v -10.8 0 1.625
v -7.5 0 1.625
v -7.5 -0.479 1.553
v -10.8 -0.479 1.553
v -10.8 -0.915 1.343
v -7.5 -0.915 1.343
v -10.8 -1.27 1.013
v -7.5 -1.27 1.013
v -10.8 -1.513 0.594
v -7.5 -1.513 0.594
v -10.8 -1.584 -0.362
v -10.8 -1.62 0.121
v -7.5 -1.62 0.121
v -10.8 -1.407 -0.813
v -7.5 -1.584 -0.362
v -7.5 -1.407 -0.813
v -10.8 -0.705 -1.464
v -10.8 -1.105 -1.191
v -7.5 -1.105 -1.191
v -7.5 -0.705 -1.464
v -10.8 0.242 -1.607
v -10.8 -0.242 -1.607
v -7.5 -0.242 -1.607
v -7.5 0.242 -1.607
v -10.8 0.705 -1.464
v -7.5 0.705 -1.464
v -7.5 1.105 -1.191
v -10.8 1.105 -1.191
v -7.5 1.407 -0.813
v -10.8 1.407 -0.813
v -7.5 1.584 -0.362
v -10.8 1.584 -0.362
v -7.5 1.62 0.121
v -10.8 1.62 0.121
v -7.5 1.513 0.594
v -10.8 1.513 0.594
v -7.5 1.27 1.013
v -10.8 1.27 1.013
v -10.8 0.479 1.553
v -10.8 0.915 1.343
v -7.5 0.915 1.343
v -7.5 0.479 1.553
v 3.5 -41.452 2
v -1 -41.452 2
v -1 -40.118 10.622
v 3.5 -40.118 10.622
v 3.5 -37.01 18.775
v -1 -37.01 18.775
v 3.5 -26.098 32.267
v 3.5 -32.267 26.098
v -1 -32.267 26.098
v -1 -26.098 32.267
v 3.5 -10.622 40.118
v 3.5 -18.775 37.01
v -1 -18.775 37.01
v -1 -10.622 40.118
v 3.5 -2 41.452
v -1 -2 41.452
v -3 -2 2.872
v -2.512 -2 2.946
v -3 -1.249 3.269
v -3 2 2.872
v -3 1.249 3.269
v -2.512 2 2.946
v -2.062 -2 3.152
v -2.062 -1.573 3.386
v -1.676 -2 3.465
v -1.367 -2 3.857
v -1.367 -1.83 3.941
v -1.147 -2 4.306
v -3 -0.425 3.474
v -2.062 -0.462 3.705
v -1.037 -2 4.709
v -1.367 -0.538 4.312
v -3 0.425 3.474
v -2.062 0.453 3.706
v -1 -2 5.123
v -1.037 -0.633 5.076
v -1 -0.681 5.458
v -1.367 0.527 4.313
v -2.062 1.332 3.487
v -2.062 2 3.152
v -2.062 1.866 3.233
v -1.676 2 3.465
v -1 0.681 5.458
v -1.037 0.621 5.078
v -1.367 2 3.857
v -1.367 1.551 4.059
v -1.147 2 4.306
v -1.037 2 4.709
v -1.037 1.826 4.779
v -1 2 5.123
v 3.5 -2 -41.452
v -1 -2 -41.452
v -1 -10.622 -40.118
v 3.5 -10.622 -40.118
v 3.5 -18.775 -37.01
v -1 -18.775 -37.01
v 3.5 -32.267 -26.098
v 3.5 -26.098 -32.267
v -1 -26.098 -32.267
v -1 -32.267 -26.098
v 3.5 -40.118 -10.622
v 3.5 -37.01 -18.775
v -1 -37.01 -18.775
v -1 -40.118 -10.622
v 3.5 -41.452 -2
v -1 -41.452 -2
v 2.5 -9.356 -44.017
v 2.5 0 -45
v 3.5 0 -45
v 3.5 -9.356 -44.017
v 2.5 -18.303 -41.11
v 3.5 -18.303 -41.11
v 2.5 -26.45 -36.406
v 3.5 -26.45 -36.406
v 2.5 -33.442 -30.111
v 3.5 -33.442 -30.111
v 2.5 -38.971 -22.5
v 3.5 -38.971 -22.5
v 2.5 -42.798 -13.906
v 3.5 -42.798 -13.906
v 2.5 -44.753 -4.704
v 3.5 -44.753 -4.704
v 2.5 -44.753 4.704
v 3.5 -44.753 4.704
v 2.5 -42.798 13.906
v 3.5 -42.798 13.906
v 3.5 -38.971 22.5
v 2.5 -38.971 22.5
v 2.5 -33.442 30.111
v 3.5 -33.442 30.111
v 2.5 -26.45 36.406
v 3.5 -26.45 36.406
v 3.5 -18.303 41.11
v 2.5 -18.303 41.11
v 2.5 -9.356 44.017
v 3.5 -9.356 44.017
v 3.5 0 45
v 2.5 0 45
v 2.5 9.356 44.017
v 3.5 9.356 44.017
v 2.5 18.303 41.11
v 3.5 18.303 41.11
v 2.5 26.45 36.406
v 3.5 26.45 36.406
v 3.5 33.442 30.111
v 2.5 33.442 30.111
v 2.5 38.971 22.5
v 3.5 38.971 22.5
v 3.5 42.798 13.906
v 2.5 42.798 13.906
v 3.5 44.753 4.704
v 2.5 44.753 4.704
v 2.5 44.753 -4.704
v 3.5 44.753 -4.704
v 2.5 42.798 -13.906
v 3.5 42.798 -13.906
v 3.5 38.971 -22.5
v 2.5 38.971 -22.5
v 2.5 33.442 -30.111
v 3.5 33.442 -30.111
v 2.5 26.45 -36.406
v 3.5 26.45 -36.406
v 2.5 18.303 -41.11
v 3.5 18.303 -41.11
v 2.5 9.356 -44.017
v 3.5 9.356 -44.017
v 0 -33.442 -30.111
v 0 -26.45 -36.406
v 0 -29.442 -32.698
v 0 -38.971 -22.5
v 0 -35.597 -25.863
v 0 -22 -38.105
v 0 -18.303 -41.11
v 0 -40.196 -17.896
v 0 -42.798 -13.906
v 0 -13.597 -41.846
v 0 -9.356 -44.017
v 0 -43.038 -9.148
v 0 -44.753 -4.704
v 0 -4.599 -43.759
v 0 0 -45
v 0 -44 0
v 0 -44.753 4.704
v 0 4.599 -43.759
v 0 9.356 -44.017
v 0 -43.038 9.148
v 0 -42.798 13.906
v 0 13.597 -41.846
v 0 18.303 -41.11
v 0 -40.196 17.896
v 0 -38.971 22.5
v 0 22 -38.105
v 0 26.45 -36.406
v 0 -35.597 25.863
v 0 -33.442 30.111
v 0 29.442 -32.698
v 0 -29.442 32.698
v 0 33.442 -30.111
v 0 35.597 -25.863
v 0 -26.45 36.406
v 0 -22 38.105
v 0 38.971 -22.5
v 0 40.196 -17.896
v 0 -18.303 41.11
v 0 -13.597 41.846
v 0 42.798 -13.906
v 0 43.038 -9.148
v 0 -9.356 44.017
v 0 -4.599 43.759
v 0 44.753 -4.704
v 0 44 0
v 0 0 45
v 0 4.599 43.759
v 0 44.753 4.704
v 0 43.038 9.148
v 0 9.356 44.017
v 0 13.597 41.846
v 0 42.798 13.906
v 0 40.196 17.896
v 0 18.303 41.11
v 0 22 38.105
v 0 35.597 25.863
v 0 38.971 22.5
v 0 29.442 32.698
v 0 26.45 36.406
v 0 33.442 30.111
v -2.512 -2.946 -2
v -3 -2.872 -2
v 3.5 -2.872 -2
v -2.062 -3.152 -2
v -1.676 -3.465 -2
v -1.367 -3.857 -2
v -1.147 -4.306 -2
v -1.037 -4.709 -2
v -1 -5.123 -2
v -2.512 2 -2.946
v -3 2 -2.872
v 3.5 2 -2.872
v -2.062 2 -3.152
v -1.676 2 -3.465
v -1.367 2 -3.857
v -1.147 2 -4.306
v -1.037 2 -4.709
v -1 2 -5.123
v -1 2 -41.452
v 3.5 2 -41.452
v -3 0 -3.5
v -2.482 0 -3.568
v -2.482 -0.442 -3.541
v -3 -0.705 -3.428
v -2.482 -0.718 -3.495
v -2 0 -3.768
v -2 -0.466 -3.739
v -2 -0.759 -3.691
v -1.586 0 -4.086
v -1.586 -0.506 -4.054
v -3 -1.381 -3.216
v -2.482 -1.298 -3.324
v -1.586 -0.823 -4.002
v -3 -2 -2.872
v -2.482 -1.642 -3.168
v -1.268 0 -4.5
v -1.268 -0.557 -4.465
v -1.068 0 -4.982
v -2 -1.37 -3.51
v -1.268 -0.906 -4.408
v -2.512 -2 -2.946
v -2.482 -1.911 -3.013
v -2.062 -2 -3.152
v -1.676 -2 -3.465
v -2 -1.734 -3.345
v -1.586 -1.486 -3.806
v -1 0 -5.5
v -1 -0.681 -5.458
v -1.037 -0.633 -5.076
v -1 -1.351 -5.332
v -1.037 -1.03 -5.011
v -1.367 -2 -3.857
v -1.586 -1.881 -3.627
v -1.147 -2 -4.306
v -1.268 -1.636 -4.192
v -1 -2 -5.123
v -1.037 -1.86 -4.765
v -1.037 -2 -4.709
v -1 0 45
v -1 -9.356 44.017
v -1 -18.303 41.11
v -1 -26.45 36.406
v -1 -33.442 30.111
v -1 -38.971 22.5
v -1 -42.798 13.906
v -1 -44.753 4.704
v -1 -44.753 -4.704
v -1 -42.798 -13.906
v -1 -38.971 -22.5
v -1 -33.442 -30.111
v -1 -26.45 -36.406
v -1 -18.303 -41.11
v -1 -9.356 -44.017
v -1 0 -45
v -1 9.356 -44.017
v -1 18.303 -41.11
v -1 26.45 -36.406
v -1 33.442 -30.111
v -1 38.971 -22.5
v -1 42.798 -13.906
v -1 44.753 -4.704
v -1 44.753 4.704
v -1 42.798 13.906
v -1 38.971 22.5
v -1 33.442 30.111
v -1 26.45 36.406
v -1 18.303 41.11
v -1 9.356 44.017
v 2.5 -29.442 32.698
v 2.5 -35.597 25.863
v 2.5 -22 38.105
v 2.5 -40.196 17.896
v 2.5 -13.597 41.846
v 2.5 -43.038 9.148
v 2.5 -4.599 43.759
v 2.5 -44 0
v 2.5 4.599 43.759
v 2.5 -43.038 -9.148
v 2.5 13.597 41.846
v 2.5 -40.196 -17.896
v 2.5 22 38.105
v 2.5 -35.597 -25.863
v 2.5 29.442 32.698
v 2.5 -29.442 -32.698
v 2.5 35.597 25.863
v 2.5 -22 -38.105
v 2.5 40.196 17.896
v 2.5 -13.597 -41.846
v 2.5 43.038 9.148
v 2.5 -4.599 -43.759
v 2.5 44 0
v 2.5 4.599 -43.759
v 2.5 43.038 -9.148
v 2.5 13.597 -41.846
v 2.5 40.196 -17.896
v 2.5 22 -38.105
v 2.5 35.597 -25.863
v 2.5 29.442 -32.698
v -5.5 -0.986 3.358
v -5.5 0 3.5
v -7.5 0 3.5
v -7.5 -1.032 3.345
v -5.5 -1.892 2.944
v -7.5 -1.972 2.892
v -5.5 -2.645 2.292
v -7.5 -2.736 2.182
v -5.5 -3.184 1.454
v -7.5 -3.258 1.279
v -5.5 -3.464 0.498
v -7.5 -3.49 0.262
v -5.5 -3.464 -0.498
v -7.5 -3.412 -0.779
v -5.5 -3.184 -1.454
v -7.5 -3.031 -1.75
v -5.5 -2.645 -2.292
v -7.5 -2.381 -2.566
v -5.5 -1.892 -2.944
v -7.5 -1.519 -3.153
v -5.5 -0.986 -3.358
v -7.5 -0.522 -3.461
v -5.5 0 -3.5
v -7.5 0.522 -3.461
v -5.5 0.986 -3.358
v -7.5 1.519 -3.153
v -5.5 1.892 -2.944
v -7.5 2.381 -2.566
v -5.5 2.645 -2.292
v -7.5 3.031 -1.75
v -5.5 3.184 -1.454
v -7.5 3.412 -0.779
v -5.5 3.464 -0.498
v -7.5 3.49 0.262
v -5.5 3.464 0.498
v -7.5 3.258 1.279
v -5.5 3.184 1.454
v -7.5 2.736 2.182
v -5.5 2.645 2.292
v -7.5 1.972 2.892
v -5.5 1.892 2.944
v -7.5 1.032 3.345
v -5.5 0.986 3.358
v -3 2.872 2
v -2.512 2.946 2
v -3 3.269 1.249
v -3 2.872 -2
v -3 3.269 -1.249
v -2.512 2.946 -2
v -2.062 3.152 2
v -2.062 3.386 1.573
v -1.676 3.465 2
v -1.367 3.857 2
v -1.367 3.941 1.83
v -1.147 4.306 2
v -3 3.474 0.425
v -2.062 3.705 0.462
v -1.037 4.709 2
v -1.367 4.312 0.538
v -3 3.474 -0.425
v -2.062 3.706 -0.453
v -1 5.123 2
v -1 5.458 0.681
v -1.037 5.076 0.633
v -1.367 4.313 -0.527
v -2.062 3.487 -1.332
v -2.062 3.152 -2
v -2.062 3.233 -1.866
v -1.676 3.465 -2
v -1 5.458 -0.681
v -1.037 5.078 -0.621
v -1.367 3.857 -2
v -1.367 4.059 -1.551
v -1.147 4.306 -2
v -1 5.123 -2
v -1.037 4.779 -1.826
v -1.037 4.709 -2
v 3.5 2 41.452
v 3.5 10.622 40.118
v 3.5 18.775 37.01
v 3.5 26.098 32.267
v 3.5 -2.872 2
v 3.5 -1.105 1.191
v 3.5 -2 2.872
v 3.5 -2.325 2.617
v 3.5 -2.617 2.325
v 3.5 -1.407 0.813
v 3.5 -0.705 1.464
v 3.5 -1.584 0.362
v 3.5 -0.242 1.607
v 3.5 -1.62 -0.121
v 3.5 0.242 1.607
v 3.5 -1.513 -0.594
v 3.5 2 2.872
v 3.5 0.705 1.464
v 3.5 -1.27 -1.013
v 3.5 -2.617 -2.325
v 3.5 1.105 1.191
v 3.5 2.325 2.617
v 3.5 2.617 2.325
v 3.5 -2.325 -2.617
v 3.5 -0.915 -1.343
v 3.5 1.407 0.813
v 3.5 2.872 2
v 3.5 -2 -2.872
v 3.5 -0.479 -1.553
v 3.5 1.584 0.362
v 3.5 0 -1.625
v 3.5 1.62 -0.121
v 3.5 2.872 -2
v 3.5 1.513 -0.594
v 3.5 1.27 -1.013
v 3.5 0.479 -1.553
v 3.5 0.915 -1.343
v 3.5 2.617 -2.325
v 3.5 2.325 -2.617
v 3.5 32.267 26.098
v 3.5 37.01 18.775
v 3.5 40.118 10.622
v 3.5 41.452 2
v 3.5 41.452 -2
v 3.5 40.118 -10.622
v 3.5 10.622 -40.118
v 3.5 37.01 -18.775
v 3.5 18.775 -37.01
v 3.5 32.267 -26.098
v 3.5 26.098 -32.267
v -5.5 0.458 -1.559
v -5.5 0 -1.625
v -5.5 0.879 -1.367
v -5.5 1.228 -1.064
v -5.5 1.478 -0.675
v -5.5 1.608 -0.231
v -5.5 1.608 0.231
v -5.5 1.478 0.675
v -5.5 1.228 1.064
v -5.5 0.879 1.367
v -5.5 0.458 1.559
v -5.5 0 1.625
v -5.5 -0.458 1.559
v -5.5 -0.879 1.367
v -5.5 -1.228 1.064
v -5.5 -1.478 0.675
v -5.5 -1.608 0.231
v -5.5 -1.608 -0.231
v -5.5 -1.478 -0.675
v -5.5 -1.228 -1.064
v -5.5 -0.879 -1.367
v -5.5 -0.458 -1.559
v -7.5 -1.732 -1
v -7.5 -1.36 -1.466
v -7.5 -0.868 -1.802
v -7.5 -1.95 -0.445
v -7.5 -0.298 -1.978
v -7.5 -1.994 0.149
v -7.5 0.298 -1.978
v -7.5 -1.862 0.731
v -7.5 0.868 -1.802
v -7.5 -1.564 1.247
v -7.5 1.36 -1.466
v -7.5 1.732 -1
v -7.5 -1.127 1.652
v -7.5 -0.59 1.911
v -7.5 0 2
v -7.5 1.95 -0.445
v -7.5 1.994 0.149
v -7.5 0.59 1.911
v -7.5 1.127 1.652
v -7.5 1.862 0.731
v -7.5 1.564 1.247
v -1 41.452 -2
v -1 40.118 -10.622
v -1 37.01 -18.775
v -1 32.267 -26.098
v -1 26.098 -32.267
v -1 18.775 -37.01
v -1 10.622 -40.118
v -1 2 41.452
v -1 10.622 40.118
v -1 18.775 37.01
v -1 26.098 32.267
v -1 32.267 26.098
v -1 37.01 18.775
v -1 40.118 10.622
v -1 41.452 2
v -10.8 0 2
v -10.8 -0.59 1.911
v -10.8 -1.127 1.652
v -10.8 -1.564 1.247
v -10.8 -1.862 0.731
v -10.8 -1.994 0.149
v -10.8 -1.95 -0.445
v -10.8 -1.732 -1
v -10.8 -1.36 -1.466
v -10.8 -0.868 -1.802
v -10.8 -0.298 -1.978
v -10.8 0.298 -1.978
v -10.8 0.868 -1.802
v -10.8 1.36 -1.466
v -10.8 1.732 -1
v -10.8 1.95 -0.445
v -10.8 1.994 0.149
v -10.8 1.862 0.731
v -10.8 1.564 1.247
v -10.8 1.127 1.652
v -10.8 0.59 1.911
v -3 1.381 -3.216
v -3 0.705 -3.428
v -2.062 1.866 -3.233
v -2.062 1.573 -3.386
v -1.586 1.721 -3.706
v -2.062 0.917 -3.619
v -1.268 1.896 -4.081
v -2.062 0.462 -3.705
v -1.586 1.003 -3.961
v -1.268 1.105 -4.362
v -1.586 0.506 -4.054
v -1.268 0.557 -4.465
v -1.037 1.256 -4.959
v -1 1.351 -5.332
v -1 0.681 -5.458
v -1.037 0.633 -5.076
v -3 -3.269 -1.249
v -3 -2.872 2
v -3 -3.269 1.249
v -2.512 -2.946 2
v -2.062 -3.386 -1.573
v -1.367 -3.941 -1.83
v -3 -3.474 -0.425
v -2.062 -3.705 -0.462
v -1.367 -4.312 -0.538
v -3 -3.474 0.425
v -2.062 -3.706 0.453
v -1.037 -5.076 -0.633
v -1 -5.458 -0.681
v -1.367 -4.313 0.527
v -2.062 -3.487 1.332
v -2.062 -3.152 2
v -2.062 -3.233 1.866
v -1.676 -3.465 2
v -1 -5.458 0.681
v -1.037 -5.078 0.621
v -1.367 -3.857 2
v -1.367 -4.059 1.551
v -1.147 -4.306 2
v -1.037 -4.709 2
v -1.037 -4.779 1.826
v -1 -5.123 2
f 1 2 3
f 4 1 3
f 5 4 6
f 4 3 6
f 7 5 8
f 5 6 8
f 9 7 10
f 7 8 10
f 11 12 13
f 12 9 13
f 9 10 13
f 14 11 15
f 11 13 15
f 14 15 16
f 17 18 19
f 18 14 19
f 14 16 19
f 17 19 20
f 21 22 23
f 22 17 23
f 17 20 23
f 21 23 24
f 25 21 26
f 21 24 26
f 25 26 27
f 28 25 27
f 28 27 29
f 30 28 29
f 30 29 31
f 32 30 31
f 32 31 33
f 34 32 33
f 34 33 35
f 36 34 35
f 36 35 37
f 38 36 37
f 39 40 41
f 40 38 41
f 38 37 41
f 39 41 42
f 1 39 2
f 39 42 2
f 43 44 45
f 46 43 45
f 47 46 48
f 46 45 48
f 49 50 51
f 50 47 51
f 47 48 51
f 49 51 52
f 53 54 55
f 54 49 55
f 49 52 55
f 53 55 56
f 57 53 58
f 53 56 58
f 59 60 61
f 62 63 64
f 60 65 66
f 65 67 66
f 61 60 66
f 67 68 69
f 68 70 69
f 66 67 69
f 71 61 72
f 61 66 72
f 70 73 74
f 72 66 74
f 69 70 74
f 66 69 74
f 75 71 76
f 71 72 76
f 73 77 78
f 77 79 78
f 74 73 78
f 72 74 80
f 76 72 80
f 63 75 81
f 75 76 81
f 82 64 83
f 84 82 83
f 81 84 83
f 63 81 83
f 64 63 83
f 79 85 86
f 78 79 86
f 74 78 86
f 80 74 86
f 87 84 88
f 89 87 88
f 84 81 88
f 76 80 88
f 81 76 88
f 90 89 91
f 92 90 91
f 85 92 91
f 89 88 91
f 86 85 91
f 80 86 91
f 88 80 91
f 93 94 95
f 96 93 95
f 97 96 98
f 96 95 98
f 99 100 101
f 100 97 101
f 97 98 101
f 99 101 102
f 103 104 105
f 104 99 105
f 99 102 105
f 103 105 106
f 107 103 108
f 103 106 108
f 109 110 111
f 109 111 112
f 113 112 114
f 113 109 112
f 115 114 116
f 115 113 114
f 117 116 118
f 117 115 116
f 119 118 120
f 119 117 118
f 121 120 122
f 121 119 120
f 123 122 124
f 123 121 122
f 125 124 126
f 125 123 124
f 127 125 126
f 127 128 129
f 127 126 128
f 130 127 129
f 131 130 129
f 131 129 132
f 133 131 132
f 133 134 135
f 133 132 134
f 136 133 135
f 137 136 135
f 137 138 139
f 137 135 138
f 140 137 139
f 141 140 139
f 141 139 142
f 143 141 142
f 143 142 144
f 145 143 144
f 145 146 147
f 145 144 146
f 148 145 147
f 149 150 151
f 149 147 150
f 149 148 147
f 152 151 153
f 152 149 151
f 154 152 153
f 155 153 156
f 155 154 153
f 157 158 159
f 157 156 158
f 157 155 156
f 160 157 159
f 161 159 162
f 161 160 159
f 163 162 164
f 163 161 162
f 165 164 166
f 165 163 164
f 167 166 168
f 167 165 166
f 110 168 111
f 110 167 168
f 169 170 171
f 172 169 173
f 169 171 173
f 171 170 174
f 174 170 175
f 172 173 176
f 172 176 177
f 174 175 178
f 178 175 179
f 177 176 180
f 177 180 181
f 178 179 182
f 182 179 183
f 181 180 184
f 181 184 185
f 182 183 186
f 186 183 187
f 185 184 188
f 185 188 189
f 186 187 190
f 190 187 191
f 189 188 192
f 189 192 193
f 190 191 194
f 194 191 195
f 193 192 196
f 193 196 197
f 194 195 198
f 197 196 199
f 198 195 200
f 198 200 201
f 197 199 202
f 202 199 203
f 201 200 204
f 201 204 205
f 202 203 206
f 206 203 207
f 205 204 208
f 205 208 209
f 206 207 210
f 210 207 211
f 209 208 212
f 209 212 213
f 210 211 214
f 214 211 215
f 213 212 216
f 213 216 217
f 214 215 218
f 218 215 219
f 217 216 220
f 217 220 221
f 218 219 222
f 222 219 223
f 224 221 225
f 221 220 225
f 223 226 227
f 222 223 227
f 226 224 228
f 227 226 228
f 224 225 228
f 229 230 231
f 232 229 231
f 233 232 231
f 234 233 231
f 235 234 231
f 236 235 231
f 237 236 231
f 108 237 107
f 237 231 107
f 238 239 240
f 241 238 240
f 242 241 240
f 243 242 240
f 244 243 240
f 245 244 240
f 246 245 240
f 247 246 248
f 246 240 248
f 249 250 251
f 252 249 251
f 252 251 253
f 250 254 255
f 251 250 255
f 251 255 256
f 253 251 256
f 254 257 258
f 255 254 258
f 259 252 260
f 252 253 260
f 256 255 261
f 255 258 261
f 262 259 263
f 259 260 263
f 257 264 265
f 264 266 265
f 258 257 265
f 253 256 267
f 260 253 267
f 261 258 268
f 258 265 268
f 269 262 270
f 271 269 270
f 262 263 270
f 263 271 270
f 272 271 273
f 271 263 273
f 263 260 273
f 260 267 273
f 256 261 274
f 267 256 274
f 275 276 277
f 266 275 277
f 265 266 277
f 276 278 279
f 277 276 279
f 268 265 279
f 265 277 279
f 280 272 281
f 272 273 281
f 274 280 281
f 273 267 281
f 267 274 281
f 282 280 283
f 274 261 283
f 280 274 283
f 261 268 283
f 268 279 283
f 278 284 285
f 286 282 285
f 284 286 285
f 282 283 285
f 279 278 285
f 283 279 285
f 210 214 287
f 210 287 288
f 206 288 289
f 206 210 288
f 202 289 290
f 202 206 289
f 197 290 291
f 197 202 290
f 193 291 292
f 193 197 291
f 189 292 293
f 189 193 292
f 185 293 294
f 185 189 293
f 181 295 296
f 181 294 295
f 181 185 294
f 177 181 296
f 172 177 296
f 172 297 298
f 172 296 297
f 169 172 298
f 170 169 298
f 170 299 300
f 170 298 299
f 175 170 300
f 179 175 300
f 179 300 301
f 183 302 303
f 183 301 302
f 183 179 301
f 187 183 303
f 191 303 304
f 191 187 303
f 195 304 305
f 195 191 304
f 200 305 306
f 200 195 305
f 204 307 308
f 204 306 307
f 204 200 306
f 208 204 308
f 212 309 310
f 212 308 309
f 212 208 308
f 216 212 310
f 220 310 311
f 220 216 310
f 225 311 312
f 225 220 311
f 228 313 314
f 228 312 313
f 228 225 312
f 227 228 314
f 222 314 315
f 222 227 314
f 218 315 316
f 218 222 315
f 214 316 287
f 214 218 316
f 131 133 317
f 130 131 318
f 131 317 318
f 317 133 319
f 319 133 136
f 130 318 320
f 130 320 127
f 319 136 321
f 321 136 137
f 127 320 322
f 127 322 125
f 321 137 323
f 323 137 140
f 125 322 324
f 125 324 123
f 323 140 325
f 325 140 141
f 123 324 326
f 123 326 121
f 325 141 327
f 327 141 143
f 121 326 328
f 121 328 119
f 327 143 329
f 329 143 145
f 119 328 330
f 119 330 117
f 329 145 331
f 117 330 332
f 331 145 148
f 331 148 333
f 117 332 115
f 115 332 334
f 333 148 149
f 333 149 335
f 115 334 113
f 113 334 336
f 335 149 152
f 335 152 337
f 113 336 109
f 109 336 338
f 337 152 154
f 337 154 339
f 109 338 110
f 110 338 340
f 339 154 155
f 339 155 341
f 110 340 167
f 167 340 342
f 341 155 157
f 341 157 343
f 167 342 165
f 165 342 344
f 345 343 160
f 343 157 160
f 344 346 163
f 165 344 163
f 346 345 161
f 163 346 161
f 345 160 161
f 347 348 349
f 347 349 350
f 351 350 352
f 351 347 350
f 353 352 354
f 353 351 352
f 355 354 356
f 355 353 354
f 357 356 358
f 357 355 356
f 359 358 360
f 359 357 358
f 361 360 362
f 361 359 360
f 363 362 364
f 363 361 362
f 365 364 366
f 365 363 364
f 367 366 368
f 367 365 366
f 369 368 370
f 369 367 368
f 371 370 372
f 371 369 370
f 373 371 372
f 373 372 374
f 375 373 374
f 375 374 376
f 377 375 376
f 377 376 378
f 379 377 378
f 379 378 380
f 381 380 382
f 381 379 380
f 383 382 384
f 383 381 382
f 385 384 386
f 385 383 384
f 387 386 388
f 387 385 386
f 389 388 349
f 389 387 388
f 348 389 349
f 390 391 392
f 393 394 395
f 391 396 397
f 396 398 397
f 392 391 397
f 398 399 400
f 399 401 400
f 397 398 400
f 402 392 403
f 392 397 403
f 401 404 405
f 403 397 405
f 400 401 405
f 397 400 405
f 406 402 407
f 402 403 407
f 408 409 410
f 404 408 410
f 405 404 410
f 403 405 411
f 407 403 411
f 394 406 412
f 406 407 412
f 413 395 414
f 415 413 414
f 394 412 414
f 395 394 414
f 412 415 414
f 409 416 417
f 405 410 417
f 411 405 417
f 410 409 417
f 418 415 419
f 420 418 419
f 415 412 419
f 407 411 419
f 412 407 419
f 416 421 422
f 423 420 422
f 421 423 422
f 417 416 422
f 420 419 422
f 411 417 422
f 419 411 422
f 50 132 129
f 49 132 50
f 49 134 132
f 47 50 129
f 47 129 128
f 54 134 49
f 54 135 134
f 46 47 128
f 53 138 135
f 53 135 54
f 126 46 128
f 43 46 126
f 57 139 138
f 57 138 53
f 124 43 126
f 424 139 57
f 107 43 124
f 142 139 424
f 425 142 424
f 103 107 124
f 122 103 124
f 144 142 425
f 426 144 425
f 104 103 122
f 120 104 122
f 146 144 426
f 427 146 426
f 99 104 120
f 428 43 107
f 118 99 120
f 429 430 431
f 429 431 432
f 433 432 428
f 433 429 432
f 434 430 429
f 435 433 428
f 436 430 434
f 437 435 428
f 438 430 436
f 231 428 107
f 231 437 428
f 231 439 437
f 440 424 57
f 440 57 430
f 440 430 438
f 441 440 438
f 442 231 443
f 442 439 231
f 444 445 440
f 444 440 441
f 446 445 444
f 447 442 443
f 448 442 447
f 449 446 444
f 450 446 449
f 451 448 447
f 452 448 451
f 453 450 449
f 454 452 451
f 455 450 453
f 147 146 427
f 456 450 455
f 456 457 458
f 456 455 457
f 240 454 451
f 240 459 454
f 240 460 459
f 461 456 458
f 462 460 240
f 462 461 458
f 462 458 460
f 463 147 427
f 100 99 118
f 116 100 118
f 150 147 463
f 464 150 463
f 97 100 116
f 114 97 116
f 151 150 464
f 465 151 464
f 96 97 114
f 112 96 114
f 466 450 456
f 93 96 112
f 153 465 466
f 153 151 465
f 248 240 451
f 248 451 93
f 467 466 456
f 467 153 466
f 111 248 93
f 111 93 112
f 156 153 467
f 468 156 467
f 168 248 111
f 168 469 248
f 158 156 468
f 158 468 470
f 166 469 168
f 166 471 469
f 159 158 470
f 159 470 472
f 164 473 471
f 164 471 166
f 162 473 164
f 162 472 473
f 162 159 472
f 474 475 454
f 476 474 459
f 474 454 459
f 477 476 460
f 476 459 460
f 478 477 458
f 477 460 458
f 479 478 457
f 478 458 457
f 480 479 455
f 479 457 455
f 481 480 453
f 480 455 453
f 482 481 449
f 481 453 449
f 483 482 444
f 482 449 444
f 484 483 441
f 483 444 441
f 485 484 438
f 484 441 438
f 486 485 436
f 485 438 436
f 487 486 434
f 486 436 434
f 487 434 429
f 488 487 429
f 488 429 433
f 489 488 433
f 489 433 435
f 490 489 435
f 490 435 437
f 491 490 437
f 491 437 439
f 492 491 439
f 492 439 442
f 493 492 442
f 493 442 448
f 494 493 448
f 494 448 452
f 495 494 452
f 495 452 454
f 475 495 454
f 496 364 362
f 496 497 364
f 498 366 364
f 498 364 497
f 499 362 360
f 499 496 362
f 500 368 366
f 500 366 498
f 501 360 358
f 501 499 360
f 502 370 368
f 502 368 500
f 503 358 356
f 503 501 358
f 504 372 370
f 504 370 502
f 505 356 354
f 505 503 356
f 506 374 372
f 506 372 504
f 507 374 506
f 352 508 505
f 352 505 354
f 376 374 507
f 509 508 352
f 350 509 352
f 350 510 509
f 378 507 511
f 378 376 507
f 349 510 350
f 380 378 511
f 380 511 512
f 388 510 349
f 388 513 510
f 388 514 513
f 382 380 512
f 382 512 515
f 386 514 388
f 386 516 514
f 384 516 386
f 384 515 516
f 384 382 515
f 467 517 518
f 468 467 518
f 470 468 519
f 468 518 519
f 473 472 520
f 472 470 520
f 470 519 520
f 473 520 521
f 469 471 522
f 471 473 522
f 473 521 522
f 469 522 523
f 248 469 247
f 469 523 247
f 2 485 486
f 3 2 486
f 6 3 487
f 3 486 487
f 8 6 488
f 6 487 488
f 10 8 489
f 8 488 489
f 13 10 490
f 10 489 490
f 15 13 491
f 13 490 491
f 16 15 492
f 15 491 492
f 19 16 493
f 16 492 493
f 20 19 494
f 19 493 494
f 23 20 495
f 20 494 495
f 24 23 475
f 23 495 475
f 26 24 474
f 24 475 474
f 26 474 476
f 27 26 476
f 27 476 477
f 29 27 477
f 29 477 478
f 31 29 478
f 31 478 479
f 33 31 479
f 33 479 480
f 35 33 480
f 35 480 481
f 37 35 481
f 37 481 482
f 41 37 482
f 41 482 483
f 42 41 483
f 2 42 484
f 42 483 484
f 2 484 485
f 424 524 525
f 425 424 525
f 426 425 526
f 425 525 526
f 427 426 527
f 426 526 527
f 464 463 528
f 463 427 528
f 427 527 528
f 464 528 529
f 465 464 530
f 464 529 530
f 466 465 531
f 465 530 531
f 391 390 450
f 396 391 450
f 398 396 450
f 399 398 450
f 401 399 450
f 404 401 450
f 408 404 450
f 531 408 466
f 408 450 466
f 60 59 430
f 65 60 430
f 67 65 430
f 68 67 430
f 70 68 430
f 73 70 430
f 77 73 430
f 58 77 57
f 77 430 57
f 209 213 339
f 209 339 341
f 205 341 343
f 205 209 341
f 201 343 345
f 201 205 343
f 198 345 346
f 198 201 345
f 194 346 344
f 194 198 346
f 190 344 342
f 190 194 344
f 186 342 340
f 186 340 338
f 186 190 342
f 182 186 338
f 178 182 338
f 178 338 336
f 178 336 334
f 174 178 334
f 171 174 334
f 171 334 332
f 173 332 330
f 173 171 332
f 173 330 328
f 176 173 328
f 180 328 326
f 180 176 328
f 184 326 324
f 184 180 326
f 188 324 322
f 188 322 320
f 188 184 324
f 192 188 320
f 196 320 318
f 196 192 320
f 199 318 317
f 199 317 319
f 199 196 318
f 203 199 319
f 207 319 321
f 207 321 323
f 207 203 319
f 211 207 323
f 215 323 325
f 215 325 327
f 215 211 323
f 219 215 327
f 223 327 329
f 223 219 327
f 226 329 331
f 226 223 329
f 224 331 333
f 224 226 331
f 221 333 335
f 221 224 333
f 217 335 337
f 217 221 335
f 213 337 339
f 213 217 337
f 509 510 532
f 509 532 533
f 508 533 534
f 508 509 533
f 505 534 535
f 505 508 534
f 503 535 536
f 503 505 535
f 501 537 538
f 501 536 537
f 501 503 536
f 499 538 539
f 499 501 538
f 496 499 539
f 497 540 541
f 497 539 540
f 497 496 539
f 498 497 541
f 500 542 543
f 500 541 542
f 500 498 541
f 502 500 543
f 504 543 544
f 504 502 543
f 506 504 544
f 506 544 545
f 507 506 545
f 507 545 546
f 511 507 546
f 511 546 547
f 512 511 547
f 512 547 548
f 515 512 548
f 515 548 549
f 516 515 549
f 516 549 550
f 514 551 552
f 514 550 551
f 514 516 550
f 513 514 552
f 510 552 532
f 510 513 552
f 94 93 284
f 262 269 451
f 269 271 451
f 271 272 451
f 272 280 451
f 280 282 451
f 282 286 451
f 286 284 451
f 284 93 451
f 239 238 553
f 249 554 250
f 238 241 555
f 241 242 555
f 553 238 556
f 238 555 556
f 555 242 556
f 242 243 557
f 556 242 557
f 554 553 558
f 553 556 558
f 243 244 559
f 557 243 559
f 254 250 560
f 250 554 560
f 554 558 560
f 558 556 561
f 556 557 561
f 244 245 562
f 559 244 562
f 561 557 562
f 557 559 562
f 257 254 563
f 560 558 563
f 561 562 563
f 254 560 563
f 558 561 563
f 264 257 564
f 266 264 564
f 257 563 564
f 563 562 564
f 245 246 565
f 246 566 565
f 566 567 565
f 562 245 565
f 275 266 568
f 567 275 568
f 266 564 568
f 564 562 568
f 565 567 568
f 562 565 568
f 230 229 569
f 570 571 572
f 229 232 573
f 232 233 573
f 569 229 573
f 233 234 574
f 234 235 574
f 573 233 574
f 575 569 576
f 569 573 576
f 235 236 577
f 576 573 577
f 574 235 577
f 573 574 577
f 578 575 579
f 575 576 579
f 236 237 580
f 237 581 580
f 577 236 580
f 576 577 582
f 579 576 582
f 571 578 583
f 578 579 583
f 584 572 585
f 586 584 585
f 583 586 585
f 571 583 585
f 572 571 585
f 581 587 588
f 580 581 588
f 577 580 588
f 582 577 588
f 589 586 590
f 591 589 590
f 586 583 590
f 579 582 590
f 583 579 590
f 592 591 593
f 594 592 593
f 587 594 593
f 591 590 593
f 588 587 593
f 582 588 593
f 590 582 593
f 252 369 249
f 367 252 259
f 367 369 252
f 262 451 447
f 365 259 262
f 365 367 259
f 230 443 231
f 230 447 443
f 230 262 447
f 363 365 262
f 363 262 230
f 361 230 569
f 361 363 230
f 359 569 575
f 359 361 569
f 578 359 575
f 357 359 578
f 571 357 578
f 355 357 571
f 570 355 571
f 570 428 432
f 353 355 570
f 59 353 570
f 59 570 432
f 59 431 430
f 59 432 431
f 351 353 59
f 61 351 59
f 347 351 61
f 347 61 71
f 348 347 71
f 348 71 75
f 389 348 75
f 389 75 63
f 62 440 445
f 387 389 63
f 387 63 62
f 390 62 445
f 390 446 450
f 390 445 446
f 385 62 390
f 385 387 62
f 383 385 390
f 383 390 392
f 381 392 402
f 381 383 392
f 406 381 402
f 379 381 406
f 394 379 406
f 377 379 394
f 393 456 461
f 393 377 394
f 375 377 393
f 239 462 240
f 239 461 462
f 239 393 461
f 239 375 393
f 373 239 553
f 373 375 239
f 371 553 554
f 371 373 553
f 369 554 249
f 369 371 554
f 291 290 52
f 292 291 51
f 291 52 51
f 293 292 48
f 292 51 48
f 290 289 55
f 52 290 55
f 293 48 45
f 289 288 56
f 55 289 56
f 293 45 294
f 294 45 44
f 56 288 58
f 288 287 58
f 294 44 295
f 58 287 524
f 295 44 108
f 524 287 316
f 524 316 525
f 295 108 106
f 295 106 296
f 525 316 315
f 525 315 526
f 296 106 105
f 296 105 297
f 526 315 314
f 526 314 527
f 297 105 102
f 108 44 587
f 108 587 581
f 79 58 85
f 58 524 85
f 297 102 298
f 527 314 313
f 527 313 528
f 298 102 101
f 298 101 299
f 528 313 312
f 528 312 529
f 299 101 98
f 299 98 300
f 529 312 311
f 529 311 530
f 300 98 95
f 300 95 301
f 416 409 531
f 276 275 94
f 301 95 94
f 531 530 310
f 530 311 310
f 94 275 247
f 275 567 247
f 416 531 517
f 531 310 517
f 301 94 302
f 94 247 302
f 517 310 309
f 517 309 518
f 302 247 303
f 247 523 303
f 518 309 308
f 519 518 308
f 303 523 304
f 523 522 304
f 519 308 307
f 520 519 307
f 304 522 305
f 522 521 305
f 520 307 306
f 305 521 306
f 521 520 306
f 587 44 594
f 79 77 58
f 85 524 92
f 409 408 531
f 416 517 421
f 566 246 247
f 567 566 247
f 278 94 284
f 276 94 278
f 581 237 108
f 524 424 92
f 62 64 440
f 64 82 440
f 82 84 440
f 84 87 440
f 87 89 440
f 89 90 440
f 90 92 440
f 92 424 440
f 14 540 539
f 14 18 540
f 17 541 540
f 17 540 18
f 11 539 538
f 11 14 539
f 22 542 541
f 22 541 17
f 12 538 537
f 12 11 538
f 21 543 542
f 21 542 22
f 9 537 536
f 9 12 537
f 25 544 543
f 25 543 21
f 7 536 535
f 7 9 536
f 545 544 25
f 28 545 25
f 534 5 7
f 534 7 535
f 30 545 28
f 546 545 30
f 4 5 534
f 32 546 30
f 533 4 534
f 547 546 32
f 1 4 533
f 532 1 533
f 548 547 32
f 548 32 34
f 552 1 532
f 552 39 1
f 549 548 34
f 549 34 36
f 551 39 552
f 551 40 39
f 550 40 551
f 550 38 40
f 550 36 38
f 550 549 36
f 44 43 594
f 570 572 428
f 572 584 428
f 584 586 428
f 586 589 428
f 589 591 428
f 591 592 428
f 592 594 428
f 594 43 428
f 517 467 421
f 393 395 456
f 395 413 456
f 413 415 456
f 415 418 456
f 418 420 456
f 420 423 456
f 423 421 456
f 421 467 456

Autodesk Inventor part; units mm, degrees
ref_plane "YZ Plane" through (0, 0, 0) normal (1, 0, 0) x (0, 1, 0)
ref_plane "XZ Plane" through (0, 0, 0) normal (0, 1, 0) x (-1, 0, 0)
ref_plane "XY Plane" through (0, 0, 0) normal (0, 0, 1) x (1, 0, 0)
sketch "Sketch1" plane through (0, 0, 0) normal (1, 0, 0) x (0, 1, 0)
  circle A0 centre (0, 0) radius 44
  dimension "d0" = 88
extrude "Extrusion1" add sketch "Sketch1" along normal blind 3.5
sketch "Sketch2" plane through (3.5, 0, 0) normal (1, 0, 0) x (0, 0, -1)
  circle A0 centre (0, 0) radius 45
  dimension "d3" = 90
extrude "Extrusion2" add sketch "Sketch2" along normal blind 1
sketch "Sketch3" plane through (0, 0, 0) normal (-1, 0, 0) x (0, 0, 1)
  circle A0 centre (0, 0) radius 45
  dimension "d6" = 90
extrude "Extrusion3" add sketch "Sketch3" along normal blind 1
sketch "Sketch4" plane through (4.5, 0, 0) normal (1, 0, 0) x (0, 0, -1)
  circle A0 centre (0, 0) radius 41.5
  dimension "d9" = 83
extrude "Extrusion4" cut sketch "Sketch4" against normal blind 6
sketch "Sketch5" plane through (4.5, 0, 0) normal (1, 0, 0) x (0, 0, -1)
  circle A0 centre (0, 0) radius 3.5
  dimension "d12" = 7
extrude "Extrusion5" add sketch "Sketch5" against normal blind 10
sketch "Sketch6" plane through (4.5, 0, 0) normal (1, 0, 0) x (0, 0, -1)
  circle A0 centre (0, 0) radius 45
extrude "Extrusion6" cut sketch "Sketch6" against normal blind 2
sketch "Sketch7" plane through (2.5, 0, 0) normal (1, 0, 0) x (0, 0, -1)
  circle A0 centre (0, 0) radius 3.5 projected
  circle A1 centre (0, 0) radius 41.5
  circle A2 centre (0, 0) radius 45
extrude "Extrusion7" add sketch "Sketch7" along normal blind 1 contours A2
sketch "Sketch8" plane through (2.5, 0, 0) normal (1, 0, 0) x (0, 0, -1)
  circle A0 centre (0, 0) radius 3.5
extrude "Extrusion8" add sketch "Sketch8" along normal blind 1
sketch "Sketch9" plane through (3.5, 0, 0) normal (1, 0, 0) x (0, 0, -1)
  circle A0 centre (0, 0) radius 1.625
  dimension "d21" = 3.25
extrude "Extrusion9" cut sketch "Sketch9" against normal blind 10
sketch "Sketch10" plane through (3.5, 0, 0) normal (1, 0, 0) x (0, 0, -1)
  line L0 (2, 2.1756) -> (-2, 2.1756)
  line L1 (-2, 2.1756) -> (-2, 42.8244)
  line L2 (-2, 42.8244) -> (2, 42.8244)
  line L3 (2, 42.8244) -> (2, 2.1756)
  line L4 (2, 2.1756) -> (-2, 42.8244) construction
  line L5 (-2, 2.1756) -> (2, 42.8244) construction
  point P0 (0, 0)
  point P1 (0, 22.5)
  dimension "d24" = 4
extrude "Extrusion10" add sketch "Sketch10" against normal blind 4.5
pattern_circular "Circular Pattern1" count 4 over 360 about axis through (4.5, 0, 0) along (-1, 0, 0) of "Extrusion10"
fillet "Fillet1" radius 2 5 edges at (-1, 0, 3.5) (-1, -3.5, 0) (-1, 3.5, 0) (-1, -1.0481, -3.3394) (-1, 1.0481, -3.3394)
sketch "Sketch11" plane through (-5.5, 0, 0) normal (-1, 0, 0) x (0, 0, 1)
  circle A0 centre (0, 0) radius 1.625
  circle A1 centre (0, 0) radius 3.5
extrude "Extrusion11" add sketch "Sketch11" along normal blind 2
sketch "Sketch12" plane through (-7.5, 0, 0) normal (-1, 0, 0) x (0, 0, 1)
  circle A0 centre (0, 0) radius 1.625
  circle A1 centre (0, 0) radius 2
  dimension "d33" = 4
extrude "Extrusion12" add sketch "Sketch12" along normal blind 3.3
properties part number "mtv_pushingWheel_2-25"
